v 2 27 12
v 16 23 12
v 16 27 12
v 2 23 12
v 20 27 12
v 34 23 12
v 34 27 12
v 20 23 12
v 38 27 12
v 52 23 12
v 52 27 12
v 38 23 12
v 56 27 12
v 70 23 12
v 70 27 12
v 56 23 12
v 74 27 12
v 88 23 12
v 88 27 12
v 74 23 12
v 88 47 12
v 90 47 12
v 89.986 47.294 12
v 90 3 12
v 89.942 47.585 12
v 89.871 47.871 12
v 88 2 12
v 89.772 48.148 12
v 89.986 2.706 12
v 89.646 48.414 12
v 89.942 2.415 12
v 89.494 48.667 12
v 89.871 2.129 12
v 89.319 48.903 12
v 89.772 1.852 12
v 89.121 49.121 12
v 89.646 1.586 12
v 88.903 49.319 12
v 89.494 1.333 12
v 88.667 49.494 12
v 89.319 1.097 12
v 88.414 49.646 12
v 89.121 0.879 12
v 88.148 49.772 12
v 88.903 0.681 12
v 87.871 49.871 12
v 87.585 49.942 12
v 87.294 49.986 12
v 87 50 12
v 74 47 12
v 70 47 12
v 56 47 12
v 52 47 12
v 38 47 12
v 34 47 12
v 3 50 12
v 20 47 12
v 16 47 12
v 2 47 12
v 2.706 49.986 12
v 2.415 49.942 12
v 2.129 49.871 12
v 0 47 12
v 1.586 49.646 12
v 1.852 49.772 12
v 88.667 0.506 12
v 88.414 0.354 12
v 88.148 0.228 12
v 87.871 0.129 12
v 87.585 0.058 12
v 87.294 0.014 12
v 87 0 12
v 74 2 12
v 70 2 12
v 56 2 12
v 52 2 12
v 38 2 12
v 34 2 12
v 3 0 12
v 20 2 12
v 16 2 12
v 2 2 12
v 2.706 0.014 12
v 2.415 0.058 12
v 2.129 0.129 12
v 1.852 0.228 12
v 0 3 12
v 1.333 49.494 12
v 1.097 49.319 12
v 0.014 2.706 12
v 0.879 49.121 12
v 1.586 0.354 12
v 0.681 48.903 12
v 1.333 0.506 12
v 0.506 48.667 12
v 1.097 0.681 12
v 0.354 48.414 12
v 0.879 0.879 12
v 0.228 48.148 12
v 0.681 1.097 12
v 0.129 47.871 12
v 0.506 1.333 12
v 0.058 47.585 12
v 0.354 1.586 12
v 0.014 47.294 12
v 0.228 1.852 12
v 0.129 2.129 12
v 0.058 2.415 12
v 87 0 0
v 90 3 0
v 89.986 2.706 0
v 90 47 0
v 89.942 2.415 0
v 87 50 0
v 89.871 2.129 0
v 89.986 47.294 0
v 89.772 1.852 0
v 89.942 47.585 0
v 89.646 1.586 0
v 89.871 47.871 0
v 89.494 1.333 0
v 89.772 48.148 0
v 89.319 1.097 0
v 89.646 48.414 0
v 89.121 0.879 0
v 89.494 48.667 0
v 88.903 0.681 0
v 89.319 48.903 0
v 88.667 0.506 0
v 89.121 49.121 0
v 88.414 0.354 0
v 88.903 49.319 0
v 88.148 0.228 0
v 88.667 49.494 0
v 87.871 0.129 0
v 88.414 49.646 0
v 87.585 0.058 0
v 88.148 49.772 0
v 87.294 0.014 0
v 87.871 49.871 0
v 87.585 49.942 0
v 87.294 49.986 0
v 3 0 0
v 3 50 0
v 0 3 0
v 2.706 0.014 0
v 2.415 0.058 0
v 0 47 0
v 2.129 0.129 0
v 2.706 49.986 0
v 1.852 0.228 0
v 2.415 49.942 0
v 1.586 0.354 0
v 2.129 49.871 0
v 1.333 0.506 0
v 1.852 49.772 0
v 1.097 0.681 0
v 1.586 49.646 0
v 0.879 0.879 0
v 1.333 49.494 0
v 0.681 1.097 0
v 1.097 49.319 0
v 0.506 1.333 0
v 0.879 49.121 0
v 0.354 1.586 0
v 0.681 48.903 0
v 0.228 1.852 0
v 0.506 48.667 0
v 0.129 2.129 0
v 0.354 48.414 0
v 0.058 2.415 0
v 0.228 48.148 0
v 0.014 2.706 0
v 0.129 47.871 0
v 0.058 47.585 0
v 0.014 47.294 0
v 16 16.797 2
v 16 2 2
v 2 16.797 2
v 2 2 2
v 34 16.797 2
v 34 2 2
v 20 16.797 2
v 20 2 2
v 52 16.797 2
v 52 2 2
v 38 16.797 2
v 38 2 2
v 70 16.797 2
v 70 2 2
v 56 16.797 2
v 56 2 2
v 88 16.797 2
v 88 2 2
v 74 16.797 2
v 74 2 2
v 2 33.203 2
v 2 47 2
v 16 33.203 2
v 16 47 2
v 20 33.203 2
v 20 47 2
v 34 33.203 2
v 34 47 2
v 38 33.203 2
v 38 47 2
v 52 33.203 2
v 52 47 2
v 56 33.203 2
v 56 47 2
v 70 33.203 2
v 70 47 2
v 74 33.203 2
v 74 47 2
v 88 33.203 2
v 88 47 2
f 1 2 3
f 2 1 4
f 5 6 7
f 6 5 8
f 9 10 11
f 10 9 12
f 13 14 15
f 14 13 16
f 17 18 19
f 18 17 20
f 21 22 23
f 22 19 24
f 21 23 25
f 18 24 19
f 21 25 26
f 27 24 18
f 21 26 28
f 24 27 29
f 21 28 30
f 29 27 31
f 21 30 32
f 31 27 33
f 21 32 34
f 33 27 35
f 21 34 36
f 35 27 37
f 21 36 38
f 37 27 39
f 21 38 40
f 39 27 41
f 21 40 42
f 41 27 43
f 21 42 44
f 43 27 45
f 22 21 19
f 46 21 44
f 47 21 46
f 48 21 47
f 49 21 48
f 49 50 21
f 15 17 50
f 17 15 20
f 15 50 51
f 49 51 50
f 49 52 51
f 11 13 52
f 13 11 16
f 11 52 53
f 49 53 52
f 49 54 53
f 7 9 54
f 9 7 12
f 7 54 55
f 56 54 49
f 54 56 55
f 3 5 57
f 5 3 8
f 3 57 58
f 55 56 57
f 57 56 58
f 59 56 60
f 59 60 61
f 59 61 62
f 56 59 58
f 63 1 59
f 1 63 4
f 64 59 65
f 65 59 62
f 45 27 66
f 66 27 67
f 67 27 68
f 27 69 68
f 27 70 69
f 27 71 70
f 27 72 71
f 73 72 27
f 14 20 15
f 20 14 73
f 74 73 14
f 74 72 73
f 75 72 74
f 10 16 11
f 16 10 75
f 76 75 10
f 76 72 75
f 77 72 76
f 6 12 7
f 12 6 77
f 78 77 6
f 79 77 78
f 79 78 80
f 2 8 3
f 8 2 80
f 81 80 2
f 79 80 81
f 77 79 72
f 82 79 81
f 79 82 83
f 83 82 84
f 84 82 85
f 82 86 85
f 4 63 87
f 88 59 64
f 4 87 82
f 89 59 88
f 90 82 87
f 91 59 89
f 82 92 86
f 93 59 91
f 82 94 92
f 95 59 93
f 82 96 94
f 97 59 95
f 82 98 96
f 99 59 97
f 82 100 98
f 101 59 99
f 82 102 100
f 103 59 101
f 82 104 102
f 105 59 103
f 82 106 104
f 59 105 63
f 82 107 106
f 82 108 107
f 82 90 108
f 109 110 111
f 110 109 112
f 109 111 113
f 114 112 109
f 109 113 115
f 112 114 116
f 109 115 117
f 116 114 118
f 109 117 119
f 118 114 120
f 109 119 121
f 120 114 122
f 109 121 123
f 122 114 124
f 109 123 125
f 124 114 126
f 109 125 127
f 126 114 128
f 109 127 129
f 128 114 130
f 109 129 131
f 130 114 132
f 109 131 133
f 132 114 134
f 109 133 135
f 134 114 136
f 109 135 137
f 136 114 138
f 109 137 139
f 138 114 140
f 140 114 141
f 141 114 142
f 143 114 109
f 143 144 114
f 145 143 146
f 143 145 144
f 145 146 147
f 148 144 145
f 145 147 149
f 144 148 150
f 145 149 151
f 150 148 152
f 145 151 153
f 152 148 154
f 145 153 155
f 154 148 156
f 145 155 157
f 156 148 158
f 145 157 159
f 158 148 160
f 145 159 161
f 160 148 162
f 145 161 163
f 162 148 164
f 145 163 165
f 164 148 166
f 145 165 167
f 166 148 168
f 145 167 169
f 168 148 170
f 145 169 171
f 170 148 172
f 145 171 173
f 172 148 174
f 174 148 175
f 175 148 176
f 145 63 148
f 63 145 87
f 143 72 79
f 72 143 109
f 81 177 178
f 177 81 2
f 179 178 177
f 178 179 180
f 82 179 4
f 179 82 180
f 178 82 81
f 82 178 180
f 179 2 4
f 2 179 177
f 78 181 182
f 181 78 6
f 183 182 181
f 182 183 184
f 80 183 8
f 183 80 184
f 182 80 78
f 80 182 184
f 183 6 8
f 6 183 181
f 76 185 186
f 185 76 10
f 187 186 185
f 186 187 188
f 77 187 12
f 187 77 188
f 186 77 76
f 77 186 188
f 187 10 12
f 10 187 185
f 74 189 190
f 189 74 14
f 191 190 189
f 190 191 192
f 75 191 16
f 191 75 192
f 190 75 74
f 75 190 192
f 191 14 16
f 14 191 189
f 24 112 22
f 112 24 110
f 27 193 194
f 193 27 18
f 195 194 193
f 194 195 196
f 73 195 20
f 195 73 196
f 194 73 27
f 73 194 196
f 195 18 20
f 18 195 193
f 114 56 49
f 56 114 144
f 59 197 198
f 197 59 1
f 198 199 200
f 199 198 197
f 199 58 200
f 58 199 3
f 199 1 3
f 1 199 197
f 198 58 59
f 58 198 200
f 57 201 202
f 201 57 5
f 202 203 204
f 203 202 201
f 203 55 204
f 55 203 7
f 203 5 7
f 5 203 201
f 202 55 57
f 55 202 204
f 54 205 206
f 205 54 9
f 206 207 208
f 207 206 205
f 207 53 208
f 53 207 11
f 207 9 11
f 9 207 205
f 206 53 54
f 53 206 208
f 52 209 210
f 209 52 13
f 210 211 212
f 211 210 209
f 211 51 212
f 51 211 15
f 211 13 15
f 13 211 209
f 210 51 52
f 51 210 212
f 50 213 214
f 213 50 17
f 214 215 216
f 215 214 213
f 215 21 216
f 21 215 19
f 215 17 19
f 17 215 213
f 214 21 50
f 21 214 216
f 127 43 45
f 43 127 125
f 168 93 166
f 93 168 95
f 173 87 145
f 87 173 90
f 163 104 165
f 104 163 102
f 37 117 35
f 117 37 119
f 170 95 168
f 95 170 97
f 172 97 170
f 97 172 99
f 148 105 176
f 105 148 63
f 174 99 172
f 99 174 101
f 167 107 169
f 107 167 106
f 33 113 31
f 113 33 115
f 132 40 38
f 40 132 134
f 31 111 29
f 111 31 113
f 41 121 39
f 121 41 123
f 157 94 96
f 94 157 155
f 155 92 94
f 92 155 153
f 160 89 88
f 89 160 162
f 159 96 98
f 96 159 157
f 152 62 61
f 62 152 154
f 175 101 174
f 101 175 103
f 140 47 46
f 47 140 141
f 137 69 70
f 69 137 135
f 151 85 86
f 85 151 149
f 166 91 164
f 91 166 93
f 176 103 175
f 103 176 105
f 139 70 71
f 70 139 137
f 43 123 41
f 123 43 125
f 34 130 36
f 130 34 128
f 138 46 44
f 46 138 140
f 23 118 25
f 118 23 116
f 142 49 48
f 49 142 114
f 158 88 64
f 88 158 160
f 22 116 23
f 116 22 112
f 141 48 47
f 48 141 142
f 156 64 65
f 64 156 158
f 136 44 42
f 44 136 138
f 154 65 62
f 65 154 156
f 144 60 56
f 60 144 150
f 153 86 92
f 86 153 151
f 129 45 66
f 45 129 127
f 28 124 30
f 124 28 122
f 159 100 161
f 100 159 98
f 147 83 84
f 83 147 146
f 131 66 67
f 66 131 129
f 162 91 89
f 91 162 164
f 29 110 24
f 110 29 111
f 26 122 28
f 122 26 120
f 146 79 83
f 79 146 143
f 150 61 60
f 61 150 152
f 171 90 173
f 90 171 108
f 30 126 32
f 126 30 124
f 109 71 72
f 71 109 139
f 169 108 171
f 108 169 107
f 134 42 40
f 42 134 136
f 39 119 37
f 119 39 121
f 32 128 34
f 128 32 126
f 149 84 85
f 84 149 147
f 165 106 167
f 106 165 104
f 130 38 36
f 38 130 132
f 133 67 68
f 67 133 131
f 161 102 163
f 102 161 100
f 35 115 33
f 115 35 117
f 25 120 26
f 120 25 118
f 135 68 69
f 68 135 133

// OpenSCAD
// Rows of paint wells for the tray
rows = 2;
// Paint wells in each row
wellsPerRow = 5;
// Wall width of paint well exterior
wellWidth = 18;
// Wall length of paint well exterior
wellLength = 25;
// Wall height of paint well exterior
wellHeight = 12;
// Wall thickness of paint well interior
wellThickness = 2;
// Thickness of border between rows and around tray edge
borderThickness = 3;

module roundedRectangle(l, w, height, borderRadius=3) {
    translate([borderRadius/2,borderRadius/2,0])
    hull() {
        cylinder(d=borderRadius,h=height,$fn=64);
        translate([l-borderRadius,0,0]) cylinder(d=borderRadius,h=height,$fn=64);
        translate([0,w-borderRadius,0]) cylinder(d=borderRadius,h=height,$fn=64);
        translate([l-borderRadius,w-borderRadius,0]) cylinder(d=borderRadius,h=height,$fn=64);
    }
}

module paintwell(width,length,height,thickness) {
    polyhedron(points = [
        [thickness,length/1.33 - thickness,thickness], //0
        [thickness,length - thickness,thickness], //1
        [thickness,length - thickness,height], //2
        [width - thickness,length/1.33 - thickness,thickness], //3
        [width - thickness,length - thickness,thickness], //4
        [width - thickness,length - thickness,height] //5
    ], faces = [
        [0,3,4,1], //bottom
        [2,5,3,0], //front
        [5,2,1,4], //back
        [5,4,3], //right
        [1,2,0] //left
    ], convexity = 10);

    difference() {
        cube([width, length, height]);

        translate([thickness,thickness,thickness])
            cube([width-thickness*2,length-thickness*2,height]);
    }
}

module trayBorder(width,length,height,thickness,rows,columns) {
    roundedRectangle(width*columns,length*rows,height,6);
}

module paintTray(rows=2, wellsPerRow=5, wellWidth=18, wellLength=25, wellHeight=12, wellThickness=2, borderThickness=3) {
    intersection() {
        trayBorder(wellWidth,wellLength,wellHeight,borderThickness,rows,wellsPerRow);

        for(i = [1:rows], j = [1:wellsPerRow]) {
            if(i % 2 == 1) { // odd
                translate([wellWidth*(j-1),wellLength*(i-1),0]) {
                    paintwell(width = wellWidth,length = wellLength,height = wellHeight,thickness = wellThickness);
                }
            } else { // even
                translate([wellWidth*(j),wellLength*i,0]) rotate([0,0,180]) {
                    paintwell(width = wellWidth,length = wellLength,height = wellHeight,thickness = wellThickness);
                    cube([wellWidth,borderThickness,wellHeight]);
                }
            }
        }
    }
}

paintTray(rows,wellsPerRow,wellWidth,wellLength,wellHeight,wellThickness,borderThickness);
